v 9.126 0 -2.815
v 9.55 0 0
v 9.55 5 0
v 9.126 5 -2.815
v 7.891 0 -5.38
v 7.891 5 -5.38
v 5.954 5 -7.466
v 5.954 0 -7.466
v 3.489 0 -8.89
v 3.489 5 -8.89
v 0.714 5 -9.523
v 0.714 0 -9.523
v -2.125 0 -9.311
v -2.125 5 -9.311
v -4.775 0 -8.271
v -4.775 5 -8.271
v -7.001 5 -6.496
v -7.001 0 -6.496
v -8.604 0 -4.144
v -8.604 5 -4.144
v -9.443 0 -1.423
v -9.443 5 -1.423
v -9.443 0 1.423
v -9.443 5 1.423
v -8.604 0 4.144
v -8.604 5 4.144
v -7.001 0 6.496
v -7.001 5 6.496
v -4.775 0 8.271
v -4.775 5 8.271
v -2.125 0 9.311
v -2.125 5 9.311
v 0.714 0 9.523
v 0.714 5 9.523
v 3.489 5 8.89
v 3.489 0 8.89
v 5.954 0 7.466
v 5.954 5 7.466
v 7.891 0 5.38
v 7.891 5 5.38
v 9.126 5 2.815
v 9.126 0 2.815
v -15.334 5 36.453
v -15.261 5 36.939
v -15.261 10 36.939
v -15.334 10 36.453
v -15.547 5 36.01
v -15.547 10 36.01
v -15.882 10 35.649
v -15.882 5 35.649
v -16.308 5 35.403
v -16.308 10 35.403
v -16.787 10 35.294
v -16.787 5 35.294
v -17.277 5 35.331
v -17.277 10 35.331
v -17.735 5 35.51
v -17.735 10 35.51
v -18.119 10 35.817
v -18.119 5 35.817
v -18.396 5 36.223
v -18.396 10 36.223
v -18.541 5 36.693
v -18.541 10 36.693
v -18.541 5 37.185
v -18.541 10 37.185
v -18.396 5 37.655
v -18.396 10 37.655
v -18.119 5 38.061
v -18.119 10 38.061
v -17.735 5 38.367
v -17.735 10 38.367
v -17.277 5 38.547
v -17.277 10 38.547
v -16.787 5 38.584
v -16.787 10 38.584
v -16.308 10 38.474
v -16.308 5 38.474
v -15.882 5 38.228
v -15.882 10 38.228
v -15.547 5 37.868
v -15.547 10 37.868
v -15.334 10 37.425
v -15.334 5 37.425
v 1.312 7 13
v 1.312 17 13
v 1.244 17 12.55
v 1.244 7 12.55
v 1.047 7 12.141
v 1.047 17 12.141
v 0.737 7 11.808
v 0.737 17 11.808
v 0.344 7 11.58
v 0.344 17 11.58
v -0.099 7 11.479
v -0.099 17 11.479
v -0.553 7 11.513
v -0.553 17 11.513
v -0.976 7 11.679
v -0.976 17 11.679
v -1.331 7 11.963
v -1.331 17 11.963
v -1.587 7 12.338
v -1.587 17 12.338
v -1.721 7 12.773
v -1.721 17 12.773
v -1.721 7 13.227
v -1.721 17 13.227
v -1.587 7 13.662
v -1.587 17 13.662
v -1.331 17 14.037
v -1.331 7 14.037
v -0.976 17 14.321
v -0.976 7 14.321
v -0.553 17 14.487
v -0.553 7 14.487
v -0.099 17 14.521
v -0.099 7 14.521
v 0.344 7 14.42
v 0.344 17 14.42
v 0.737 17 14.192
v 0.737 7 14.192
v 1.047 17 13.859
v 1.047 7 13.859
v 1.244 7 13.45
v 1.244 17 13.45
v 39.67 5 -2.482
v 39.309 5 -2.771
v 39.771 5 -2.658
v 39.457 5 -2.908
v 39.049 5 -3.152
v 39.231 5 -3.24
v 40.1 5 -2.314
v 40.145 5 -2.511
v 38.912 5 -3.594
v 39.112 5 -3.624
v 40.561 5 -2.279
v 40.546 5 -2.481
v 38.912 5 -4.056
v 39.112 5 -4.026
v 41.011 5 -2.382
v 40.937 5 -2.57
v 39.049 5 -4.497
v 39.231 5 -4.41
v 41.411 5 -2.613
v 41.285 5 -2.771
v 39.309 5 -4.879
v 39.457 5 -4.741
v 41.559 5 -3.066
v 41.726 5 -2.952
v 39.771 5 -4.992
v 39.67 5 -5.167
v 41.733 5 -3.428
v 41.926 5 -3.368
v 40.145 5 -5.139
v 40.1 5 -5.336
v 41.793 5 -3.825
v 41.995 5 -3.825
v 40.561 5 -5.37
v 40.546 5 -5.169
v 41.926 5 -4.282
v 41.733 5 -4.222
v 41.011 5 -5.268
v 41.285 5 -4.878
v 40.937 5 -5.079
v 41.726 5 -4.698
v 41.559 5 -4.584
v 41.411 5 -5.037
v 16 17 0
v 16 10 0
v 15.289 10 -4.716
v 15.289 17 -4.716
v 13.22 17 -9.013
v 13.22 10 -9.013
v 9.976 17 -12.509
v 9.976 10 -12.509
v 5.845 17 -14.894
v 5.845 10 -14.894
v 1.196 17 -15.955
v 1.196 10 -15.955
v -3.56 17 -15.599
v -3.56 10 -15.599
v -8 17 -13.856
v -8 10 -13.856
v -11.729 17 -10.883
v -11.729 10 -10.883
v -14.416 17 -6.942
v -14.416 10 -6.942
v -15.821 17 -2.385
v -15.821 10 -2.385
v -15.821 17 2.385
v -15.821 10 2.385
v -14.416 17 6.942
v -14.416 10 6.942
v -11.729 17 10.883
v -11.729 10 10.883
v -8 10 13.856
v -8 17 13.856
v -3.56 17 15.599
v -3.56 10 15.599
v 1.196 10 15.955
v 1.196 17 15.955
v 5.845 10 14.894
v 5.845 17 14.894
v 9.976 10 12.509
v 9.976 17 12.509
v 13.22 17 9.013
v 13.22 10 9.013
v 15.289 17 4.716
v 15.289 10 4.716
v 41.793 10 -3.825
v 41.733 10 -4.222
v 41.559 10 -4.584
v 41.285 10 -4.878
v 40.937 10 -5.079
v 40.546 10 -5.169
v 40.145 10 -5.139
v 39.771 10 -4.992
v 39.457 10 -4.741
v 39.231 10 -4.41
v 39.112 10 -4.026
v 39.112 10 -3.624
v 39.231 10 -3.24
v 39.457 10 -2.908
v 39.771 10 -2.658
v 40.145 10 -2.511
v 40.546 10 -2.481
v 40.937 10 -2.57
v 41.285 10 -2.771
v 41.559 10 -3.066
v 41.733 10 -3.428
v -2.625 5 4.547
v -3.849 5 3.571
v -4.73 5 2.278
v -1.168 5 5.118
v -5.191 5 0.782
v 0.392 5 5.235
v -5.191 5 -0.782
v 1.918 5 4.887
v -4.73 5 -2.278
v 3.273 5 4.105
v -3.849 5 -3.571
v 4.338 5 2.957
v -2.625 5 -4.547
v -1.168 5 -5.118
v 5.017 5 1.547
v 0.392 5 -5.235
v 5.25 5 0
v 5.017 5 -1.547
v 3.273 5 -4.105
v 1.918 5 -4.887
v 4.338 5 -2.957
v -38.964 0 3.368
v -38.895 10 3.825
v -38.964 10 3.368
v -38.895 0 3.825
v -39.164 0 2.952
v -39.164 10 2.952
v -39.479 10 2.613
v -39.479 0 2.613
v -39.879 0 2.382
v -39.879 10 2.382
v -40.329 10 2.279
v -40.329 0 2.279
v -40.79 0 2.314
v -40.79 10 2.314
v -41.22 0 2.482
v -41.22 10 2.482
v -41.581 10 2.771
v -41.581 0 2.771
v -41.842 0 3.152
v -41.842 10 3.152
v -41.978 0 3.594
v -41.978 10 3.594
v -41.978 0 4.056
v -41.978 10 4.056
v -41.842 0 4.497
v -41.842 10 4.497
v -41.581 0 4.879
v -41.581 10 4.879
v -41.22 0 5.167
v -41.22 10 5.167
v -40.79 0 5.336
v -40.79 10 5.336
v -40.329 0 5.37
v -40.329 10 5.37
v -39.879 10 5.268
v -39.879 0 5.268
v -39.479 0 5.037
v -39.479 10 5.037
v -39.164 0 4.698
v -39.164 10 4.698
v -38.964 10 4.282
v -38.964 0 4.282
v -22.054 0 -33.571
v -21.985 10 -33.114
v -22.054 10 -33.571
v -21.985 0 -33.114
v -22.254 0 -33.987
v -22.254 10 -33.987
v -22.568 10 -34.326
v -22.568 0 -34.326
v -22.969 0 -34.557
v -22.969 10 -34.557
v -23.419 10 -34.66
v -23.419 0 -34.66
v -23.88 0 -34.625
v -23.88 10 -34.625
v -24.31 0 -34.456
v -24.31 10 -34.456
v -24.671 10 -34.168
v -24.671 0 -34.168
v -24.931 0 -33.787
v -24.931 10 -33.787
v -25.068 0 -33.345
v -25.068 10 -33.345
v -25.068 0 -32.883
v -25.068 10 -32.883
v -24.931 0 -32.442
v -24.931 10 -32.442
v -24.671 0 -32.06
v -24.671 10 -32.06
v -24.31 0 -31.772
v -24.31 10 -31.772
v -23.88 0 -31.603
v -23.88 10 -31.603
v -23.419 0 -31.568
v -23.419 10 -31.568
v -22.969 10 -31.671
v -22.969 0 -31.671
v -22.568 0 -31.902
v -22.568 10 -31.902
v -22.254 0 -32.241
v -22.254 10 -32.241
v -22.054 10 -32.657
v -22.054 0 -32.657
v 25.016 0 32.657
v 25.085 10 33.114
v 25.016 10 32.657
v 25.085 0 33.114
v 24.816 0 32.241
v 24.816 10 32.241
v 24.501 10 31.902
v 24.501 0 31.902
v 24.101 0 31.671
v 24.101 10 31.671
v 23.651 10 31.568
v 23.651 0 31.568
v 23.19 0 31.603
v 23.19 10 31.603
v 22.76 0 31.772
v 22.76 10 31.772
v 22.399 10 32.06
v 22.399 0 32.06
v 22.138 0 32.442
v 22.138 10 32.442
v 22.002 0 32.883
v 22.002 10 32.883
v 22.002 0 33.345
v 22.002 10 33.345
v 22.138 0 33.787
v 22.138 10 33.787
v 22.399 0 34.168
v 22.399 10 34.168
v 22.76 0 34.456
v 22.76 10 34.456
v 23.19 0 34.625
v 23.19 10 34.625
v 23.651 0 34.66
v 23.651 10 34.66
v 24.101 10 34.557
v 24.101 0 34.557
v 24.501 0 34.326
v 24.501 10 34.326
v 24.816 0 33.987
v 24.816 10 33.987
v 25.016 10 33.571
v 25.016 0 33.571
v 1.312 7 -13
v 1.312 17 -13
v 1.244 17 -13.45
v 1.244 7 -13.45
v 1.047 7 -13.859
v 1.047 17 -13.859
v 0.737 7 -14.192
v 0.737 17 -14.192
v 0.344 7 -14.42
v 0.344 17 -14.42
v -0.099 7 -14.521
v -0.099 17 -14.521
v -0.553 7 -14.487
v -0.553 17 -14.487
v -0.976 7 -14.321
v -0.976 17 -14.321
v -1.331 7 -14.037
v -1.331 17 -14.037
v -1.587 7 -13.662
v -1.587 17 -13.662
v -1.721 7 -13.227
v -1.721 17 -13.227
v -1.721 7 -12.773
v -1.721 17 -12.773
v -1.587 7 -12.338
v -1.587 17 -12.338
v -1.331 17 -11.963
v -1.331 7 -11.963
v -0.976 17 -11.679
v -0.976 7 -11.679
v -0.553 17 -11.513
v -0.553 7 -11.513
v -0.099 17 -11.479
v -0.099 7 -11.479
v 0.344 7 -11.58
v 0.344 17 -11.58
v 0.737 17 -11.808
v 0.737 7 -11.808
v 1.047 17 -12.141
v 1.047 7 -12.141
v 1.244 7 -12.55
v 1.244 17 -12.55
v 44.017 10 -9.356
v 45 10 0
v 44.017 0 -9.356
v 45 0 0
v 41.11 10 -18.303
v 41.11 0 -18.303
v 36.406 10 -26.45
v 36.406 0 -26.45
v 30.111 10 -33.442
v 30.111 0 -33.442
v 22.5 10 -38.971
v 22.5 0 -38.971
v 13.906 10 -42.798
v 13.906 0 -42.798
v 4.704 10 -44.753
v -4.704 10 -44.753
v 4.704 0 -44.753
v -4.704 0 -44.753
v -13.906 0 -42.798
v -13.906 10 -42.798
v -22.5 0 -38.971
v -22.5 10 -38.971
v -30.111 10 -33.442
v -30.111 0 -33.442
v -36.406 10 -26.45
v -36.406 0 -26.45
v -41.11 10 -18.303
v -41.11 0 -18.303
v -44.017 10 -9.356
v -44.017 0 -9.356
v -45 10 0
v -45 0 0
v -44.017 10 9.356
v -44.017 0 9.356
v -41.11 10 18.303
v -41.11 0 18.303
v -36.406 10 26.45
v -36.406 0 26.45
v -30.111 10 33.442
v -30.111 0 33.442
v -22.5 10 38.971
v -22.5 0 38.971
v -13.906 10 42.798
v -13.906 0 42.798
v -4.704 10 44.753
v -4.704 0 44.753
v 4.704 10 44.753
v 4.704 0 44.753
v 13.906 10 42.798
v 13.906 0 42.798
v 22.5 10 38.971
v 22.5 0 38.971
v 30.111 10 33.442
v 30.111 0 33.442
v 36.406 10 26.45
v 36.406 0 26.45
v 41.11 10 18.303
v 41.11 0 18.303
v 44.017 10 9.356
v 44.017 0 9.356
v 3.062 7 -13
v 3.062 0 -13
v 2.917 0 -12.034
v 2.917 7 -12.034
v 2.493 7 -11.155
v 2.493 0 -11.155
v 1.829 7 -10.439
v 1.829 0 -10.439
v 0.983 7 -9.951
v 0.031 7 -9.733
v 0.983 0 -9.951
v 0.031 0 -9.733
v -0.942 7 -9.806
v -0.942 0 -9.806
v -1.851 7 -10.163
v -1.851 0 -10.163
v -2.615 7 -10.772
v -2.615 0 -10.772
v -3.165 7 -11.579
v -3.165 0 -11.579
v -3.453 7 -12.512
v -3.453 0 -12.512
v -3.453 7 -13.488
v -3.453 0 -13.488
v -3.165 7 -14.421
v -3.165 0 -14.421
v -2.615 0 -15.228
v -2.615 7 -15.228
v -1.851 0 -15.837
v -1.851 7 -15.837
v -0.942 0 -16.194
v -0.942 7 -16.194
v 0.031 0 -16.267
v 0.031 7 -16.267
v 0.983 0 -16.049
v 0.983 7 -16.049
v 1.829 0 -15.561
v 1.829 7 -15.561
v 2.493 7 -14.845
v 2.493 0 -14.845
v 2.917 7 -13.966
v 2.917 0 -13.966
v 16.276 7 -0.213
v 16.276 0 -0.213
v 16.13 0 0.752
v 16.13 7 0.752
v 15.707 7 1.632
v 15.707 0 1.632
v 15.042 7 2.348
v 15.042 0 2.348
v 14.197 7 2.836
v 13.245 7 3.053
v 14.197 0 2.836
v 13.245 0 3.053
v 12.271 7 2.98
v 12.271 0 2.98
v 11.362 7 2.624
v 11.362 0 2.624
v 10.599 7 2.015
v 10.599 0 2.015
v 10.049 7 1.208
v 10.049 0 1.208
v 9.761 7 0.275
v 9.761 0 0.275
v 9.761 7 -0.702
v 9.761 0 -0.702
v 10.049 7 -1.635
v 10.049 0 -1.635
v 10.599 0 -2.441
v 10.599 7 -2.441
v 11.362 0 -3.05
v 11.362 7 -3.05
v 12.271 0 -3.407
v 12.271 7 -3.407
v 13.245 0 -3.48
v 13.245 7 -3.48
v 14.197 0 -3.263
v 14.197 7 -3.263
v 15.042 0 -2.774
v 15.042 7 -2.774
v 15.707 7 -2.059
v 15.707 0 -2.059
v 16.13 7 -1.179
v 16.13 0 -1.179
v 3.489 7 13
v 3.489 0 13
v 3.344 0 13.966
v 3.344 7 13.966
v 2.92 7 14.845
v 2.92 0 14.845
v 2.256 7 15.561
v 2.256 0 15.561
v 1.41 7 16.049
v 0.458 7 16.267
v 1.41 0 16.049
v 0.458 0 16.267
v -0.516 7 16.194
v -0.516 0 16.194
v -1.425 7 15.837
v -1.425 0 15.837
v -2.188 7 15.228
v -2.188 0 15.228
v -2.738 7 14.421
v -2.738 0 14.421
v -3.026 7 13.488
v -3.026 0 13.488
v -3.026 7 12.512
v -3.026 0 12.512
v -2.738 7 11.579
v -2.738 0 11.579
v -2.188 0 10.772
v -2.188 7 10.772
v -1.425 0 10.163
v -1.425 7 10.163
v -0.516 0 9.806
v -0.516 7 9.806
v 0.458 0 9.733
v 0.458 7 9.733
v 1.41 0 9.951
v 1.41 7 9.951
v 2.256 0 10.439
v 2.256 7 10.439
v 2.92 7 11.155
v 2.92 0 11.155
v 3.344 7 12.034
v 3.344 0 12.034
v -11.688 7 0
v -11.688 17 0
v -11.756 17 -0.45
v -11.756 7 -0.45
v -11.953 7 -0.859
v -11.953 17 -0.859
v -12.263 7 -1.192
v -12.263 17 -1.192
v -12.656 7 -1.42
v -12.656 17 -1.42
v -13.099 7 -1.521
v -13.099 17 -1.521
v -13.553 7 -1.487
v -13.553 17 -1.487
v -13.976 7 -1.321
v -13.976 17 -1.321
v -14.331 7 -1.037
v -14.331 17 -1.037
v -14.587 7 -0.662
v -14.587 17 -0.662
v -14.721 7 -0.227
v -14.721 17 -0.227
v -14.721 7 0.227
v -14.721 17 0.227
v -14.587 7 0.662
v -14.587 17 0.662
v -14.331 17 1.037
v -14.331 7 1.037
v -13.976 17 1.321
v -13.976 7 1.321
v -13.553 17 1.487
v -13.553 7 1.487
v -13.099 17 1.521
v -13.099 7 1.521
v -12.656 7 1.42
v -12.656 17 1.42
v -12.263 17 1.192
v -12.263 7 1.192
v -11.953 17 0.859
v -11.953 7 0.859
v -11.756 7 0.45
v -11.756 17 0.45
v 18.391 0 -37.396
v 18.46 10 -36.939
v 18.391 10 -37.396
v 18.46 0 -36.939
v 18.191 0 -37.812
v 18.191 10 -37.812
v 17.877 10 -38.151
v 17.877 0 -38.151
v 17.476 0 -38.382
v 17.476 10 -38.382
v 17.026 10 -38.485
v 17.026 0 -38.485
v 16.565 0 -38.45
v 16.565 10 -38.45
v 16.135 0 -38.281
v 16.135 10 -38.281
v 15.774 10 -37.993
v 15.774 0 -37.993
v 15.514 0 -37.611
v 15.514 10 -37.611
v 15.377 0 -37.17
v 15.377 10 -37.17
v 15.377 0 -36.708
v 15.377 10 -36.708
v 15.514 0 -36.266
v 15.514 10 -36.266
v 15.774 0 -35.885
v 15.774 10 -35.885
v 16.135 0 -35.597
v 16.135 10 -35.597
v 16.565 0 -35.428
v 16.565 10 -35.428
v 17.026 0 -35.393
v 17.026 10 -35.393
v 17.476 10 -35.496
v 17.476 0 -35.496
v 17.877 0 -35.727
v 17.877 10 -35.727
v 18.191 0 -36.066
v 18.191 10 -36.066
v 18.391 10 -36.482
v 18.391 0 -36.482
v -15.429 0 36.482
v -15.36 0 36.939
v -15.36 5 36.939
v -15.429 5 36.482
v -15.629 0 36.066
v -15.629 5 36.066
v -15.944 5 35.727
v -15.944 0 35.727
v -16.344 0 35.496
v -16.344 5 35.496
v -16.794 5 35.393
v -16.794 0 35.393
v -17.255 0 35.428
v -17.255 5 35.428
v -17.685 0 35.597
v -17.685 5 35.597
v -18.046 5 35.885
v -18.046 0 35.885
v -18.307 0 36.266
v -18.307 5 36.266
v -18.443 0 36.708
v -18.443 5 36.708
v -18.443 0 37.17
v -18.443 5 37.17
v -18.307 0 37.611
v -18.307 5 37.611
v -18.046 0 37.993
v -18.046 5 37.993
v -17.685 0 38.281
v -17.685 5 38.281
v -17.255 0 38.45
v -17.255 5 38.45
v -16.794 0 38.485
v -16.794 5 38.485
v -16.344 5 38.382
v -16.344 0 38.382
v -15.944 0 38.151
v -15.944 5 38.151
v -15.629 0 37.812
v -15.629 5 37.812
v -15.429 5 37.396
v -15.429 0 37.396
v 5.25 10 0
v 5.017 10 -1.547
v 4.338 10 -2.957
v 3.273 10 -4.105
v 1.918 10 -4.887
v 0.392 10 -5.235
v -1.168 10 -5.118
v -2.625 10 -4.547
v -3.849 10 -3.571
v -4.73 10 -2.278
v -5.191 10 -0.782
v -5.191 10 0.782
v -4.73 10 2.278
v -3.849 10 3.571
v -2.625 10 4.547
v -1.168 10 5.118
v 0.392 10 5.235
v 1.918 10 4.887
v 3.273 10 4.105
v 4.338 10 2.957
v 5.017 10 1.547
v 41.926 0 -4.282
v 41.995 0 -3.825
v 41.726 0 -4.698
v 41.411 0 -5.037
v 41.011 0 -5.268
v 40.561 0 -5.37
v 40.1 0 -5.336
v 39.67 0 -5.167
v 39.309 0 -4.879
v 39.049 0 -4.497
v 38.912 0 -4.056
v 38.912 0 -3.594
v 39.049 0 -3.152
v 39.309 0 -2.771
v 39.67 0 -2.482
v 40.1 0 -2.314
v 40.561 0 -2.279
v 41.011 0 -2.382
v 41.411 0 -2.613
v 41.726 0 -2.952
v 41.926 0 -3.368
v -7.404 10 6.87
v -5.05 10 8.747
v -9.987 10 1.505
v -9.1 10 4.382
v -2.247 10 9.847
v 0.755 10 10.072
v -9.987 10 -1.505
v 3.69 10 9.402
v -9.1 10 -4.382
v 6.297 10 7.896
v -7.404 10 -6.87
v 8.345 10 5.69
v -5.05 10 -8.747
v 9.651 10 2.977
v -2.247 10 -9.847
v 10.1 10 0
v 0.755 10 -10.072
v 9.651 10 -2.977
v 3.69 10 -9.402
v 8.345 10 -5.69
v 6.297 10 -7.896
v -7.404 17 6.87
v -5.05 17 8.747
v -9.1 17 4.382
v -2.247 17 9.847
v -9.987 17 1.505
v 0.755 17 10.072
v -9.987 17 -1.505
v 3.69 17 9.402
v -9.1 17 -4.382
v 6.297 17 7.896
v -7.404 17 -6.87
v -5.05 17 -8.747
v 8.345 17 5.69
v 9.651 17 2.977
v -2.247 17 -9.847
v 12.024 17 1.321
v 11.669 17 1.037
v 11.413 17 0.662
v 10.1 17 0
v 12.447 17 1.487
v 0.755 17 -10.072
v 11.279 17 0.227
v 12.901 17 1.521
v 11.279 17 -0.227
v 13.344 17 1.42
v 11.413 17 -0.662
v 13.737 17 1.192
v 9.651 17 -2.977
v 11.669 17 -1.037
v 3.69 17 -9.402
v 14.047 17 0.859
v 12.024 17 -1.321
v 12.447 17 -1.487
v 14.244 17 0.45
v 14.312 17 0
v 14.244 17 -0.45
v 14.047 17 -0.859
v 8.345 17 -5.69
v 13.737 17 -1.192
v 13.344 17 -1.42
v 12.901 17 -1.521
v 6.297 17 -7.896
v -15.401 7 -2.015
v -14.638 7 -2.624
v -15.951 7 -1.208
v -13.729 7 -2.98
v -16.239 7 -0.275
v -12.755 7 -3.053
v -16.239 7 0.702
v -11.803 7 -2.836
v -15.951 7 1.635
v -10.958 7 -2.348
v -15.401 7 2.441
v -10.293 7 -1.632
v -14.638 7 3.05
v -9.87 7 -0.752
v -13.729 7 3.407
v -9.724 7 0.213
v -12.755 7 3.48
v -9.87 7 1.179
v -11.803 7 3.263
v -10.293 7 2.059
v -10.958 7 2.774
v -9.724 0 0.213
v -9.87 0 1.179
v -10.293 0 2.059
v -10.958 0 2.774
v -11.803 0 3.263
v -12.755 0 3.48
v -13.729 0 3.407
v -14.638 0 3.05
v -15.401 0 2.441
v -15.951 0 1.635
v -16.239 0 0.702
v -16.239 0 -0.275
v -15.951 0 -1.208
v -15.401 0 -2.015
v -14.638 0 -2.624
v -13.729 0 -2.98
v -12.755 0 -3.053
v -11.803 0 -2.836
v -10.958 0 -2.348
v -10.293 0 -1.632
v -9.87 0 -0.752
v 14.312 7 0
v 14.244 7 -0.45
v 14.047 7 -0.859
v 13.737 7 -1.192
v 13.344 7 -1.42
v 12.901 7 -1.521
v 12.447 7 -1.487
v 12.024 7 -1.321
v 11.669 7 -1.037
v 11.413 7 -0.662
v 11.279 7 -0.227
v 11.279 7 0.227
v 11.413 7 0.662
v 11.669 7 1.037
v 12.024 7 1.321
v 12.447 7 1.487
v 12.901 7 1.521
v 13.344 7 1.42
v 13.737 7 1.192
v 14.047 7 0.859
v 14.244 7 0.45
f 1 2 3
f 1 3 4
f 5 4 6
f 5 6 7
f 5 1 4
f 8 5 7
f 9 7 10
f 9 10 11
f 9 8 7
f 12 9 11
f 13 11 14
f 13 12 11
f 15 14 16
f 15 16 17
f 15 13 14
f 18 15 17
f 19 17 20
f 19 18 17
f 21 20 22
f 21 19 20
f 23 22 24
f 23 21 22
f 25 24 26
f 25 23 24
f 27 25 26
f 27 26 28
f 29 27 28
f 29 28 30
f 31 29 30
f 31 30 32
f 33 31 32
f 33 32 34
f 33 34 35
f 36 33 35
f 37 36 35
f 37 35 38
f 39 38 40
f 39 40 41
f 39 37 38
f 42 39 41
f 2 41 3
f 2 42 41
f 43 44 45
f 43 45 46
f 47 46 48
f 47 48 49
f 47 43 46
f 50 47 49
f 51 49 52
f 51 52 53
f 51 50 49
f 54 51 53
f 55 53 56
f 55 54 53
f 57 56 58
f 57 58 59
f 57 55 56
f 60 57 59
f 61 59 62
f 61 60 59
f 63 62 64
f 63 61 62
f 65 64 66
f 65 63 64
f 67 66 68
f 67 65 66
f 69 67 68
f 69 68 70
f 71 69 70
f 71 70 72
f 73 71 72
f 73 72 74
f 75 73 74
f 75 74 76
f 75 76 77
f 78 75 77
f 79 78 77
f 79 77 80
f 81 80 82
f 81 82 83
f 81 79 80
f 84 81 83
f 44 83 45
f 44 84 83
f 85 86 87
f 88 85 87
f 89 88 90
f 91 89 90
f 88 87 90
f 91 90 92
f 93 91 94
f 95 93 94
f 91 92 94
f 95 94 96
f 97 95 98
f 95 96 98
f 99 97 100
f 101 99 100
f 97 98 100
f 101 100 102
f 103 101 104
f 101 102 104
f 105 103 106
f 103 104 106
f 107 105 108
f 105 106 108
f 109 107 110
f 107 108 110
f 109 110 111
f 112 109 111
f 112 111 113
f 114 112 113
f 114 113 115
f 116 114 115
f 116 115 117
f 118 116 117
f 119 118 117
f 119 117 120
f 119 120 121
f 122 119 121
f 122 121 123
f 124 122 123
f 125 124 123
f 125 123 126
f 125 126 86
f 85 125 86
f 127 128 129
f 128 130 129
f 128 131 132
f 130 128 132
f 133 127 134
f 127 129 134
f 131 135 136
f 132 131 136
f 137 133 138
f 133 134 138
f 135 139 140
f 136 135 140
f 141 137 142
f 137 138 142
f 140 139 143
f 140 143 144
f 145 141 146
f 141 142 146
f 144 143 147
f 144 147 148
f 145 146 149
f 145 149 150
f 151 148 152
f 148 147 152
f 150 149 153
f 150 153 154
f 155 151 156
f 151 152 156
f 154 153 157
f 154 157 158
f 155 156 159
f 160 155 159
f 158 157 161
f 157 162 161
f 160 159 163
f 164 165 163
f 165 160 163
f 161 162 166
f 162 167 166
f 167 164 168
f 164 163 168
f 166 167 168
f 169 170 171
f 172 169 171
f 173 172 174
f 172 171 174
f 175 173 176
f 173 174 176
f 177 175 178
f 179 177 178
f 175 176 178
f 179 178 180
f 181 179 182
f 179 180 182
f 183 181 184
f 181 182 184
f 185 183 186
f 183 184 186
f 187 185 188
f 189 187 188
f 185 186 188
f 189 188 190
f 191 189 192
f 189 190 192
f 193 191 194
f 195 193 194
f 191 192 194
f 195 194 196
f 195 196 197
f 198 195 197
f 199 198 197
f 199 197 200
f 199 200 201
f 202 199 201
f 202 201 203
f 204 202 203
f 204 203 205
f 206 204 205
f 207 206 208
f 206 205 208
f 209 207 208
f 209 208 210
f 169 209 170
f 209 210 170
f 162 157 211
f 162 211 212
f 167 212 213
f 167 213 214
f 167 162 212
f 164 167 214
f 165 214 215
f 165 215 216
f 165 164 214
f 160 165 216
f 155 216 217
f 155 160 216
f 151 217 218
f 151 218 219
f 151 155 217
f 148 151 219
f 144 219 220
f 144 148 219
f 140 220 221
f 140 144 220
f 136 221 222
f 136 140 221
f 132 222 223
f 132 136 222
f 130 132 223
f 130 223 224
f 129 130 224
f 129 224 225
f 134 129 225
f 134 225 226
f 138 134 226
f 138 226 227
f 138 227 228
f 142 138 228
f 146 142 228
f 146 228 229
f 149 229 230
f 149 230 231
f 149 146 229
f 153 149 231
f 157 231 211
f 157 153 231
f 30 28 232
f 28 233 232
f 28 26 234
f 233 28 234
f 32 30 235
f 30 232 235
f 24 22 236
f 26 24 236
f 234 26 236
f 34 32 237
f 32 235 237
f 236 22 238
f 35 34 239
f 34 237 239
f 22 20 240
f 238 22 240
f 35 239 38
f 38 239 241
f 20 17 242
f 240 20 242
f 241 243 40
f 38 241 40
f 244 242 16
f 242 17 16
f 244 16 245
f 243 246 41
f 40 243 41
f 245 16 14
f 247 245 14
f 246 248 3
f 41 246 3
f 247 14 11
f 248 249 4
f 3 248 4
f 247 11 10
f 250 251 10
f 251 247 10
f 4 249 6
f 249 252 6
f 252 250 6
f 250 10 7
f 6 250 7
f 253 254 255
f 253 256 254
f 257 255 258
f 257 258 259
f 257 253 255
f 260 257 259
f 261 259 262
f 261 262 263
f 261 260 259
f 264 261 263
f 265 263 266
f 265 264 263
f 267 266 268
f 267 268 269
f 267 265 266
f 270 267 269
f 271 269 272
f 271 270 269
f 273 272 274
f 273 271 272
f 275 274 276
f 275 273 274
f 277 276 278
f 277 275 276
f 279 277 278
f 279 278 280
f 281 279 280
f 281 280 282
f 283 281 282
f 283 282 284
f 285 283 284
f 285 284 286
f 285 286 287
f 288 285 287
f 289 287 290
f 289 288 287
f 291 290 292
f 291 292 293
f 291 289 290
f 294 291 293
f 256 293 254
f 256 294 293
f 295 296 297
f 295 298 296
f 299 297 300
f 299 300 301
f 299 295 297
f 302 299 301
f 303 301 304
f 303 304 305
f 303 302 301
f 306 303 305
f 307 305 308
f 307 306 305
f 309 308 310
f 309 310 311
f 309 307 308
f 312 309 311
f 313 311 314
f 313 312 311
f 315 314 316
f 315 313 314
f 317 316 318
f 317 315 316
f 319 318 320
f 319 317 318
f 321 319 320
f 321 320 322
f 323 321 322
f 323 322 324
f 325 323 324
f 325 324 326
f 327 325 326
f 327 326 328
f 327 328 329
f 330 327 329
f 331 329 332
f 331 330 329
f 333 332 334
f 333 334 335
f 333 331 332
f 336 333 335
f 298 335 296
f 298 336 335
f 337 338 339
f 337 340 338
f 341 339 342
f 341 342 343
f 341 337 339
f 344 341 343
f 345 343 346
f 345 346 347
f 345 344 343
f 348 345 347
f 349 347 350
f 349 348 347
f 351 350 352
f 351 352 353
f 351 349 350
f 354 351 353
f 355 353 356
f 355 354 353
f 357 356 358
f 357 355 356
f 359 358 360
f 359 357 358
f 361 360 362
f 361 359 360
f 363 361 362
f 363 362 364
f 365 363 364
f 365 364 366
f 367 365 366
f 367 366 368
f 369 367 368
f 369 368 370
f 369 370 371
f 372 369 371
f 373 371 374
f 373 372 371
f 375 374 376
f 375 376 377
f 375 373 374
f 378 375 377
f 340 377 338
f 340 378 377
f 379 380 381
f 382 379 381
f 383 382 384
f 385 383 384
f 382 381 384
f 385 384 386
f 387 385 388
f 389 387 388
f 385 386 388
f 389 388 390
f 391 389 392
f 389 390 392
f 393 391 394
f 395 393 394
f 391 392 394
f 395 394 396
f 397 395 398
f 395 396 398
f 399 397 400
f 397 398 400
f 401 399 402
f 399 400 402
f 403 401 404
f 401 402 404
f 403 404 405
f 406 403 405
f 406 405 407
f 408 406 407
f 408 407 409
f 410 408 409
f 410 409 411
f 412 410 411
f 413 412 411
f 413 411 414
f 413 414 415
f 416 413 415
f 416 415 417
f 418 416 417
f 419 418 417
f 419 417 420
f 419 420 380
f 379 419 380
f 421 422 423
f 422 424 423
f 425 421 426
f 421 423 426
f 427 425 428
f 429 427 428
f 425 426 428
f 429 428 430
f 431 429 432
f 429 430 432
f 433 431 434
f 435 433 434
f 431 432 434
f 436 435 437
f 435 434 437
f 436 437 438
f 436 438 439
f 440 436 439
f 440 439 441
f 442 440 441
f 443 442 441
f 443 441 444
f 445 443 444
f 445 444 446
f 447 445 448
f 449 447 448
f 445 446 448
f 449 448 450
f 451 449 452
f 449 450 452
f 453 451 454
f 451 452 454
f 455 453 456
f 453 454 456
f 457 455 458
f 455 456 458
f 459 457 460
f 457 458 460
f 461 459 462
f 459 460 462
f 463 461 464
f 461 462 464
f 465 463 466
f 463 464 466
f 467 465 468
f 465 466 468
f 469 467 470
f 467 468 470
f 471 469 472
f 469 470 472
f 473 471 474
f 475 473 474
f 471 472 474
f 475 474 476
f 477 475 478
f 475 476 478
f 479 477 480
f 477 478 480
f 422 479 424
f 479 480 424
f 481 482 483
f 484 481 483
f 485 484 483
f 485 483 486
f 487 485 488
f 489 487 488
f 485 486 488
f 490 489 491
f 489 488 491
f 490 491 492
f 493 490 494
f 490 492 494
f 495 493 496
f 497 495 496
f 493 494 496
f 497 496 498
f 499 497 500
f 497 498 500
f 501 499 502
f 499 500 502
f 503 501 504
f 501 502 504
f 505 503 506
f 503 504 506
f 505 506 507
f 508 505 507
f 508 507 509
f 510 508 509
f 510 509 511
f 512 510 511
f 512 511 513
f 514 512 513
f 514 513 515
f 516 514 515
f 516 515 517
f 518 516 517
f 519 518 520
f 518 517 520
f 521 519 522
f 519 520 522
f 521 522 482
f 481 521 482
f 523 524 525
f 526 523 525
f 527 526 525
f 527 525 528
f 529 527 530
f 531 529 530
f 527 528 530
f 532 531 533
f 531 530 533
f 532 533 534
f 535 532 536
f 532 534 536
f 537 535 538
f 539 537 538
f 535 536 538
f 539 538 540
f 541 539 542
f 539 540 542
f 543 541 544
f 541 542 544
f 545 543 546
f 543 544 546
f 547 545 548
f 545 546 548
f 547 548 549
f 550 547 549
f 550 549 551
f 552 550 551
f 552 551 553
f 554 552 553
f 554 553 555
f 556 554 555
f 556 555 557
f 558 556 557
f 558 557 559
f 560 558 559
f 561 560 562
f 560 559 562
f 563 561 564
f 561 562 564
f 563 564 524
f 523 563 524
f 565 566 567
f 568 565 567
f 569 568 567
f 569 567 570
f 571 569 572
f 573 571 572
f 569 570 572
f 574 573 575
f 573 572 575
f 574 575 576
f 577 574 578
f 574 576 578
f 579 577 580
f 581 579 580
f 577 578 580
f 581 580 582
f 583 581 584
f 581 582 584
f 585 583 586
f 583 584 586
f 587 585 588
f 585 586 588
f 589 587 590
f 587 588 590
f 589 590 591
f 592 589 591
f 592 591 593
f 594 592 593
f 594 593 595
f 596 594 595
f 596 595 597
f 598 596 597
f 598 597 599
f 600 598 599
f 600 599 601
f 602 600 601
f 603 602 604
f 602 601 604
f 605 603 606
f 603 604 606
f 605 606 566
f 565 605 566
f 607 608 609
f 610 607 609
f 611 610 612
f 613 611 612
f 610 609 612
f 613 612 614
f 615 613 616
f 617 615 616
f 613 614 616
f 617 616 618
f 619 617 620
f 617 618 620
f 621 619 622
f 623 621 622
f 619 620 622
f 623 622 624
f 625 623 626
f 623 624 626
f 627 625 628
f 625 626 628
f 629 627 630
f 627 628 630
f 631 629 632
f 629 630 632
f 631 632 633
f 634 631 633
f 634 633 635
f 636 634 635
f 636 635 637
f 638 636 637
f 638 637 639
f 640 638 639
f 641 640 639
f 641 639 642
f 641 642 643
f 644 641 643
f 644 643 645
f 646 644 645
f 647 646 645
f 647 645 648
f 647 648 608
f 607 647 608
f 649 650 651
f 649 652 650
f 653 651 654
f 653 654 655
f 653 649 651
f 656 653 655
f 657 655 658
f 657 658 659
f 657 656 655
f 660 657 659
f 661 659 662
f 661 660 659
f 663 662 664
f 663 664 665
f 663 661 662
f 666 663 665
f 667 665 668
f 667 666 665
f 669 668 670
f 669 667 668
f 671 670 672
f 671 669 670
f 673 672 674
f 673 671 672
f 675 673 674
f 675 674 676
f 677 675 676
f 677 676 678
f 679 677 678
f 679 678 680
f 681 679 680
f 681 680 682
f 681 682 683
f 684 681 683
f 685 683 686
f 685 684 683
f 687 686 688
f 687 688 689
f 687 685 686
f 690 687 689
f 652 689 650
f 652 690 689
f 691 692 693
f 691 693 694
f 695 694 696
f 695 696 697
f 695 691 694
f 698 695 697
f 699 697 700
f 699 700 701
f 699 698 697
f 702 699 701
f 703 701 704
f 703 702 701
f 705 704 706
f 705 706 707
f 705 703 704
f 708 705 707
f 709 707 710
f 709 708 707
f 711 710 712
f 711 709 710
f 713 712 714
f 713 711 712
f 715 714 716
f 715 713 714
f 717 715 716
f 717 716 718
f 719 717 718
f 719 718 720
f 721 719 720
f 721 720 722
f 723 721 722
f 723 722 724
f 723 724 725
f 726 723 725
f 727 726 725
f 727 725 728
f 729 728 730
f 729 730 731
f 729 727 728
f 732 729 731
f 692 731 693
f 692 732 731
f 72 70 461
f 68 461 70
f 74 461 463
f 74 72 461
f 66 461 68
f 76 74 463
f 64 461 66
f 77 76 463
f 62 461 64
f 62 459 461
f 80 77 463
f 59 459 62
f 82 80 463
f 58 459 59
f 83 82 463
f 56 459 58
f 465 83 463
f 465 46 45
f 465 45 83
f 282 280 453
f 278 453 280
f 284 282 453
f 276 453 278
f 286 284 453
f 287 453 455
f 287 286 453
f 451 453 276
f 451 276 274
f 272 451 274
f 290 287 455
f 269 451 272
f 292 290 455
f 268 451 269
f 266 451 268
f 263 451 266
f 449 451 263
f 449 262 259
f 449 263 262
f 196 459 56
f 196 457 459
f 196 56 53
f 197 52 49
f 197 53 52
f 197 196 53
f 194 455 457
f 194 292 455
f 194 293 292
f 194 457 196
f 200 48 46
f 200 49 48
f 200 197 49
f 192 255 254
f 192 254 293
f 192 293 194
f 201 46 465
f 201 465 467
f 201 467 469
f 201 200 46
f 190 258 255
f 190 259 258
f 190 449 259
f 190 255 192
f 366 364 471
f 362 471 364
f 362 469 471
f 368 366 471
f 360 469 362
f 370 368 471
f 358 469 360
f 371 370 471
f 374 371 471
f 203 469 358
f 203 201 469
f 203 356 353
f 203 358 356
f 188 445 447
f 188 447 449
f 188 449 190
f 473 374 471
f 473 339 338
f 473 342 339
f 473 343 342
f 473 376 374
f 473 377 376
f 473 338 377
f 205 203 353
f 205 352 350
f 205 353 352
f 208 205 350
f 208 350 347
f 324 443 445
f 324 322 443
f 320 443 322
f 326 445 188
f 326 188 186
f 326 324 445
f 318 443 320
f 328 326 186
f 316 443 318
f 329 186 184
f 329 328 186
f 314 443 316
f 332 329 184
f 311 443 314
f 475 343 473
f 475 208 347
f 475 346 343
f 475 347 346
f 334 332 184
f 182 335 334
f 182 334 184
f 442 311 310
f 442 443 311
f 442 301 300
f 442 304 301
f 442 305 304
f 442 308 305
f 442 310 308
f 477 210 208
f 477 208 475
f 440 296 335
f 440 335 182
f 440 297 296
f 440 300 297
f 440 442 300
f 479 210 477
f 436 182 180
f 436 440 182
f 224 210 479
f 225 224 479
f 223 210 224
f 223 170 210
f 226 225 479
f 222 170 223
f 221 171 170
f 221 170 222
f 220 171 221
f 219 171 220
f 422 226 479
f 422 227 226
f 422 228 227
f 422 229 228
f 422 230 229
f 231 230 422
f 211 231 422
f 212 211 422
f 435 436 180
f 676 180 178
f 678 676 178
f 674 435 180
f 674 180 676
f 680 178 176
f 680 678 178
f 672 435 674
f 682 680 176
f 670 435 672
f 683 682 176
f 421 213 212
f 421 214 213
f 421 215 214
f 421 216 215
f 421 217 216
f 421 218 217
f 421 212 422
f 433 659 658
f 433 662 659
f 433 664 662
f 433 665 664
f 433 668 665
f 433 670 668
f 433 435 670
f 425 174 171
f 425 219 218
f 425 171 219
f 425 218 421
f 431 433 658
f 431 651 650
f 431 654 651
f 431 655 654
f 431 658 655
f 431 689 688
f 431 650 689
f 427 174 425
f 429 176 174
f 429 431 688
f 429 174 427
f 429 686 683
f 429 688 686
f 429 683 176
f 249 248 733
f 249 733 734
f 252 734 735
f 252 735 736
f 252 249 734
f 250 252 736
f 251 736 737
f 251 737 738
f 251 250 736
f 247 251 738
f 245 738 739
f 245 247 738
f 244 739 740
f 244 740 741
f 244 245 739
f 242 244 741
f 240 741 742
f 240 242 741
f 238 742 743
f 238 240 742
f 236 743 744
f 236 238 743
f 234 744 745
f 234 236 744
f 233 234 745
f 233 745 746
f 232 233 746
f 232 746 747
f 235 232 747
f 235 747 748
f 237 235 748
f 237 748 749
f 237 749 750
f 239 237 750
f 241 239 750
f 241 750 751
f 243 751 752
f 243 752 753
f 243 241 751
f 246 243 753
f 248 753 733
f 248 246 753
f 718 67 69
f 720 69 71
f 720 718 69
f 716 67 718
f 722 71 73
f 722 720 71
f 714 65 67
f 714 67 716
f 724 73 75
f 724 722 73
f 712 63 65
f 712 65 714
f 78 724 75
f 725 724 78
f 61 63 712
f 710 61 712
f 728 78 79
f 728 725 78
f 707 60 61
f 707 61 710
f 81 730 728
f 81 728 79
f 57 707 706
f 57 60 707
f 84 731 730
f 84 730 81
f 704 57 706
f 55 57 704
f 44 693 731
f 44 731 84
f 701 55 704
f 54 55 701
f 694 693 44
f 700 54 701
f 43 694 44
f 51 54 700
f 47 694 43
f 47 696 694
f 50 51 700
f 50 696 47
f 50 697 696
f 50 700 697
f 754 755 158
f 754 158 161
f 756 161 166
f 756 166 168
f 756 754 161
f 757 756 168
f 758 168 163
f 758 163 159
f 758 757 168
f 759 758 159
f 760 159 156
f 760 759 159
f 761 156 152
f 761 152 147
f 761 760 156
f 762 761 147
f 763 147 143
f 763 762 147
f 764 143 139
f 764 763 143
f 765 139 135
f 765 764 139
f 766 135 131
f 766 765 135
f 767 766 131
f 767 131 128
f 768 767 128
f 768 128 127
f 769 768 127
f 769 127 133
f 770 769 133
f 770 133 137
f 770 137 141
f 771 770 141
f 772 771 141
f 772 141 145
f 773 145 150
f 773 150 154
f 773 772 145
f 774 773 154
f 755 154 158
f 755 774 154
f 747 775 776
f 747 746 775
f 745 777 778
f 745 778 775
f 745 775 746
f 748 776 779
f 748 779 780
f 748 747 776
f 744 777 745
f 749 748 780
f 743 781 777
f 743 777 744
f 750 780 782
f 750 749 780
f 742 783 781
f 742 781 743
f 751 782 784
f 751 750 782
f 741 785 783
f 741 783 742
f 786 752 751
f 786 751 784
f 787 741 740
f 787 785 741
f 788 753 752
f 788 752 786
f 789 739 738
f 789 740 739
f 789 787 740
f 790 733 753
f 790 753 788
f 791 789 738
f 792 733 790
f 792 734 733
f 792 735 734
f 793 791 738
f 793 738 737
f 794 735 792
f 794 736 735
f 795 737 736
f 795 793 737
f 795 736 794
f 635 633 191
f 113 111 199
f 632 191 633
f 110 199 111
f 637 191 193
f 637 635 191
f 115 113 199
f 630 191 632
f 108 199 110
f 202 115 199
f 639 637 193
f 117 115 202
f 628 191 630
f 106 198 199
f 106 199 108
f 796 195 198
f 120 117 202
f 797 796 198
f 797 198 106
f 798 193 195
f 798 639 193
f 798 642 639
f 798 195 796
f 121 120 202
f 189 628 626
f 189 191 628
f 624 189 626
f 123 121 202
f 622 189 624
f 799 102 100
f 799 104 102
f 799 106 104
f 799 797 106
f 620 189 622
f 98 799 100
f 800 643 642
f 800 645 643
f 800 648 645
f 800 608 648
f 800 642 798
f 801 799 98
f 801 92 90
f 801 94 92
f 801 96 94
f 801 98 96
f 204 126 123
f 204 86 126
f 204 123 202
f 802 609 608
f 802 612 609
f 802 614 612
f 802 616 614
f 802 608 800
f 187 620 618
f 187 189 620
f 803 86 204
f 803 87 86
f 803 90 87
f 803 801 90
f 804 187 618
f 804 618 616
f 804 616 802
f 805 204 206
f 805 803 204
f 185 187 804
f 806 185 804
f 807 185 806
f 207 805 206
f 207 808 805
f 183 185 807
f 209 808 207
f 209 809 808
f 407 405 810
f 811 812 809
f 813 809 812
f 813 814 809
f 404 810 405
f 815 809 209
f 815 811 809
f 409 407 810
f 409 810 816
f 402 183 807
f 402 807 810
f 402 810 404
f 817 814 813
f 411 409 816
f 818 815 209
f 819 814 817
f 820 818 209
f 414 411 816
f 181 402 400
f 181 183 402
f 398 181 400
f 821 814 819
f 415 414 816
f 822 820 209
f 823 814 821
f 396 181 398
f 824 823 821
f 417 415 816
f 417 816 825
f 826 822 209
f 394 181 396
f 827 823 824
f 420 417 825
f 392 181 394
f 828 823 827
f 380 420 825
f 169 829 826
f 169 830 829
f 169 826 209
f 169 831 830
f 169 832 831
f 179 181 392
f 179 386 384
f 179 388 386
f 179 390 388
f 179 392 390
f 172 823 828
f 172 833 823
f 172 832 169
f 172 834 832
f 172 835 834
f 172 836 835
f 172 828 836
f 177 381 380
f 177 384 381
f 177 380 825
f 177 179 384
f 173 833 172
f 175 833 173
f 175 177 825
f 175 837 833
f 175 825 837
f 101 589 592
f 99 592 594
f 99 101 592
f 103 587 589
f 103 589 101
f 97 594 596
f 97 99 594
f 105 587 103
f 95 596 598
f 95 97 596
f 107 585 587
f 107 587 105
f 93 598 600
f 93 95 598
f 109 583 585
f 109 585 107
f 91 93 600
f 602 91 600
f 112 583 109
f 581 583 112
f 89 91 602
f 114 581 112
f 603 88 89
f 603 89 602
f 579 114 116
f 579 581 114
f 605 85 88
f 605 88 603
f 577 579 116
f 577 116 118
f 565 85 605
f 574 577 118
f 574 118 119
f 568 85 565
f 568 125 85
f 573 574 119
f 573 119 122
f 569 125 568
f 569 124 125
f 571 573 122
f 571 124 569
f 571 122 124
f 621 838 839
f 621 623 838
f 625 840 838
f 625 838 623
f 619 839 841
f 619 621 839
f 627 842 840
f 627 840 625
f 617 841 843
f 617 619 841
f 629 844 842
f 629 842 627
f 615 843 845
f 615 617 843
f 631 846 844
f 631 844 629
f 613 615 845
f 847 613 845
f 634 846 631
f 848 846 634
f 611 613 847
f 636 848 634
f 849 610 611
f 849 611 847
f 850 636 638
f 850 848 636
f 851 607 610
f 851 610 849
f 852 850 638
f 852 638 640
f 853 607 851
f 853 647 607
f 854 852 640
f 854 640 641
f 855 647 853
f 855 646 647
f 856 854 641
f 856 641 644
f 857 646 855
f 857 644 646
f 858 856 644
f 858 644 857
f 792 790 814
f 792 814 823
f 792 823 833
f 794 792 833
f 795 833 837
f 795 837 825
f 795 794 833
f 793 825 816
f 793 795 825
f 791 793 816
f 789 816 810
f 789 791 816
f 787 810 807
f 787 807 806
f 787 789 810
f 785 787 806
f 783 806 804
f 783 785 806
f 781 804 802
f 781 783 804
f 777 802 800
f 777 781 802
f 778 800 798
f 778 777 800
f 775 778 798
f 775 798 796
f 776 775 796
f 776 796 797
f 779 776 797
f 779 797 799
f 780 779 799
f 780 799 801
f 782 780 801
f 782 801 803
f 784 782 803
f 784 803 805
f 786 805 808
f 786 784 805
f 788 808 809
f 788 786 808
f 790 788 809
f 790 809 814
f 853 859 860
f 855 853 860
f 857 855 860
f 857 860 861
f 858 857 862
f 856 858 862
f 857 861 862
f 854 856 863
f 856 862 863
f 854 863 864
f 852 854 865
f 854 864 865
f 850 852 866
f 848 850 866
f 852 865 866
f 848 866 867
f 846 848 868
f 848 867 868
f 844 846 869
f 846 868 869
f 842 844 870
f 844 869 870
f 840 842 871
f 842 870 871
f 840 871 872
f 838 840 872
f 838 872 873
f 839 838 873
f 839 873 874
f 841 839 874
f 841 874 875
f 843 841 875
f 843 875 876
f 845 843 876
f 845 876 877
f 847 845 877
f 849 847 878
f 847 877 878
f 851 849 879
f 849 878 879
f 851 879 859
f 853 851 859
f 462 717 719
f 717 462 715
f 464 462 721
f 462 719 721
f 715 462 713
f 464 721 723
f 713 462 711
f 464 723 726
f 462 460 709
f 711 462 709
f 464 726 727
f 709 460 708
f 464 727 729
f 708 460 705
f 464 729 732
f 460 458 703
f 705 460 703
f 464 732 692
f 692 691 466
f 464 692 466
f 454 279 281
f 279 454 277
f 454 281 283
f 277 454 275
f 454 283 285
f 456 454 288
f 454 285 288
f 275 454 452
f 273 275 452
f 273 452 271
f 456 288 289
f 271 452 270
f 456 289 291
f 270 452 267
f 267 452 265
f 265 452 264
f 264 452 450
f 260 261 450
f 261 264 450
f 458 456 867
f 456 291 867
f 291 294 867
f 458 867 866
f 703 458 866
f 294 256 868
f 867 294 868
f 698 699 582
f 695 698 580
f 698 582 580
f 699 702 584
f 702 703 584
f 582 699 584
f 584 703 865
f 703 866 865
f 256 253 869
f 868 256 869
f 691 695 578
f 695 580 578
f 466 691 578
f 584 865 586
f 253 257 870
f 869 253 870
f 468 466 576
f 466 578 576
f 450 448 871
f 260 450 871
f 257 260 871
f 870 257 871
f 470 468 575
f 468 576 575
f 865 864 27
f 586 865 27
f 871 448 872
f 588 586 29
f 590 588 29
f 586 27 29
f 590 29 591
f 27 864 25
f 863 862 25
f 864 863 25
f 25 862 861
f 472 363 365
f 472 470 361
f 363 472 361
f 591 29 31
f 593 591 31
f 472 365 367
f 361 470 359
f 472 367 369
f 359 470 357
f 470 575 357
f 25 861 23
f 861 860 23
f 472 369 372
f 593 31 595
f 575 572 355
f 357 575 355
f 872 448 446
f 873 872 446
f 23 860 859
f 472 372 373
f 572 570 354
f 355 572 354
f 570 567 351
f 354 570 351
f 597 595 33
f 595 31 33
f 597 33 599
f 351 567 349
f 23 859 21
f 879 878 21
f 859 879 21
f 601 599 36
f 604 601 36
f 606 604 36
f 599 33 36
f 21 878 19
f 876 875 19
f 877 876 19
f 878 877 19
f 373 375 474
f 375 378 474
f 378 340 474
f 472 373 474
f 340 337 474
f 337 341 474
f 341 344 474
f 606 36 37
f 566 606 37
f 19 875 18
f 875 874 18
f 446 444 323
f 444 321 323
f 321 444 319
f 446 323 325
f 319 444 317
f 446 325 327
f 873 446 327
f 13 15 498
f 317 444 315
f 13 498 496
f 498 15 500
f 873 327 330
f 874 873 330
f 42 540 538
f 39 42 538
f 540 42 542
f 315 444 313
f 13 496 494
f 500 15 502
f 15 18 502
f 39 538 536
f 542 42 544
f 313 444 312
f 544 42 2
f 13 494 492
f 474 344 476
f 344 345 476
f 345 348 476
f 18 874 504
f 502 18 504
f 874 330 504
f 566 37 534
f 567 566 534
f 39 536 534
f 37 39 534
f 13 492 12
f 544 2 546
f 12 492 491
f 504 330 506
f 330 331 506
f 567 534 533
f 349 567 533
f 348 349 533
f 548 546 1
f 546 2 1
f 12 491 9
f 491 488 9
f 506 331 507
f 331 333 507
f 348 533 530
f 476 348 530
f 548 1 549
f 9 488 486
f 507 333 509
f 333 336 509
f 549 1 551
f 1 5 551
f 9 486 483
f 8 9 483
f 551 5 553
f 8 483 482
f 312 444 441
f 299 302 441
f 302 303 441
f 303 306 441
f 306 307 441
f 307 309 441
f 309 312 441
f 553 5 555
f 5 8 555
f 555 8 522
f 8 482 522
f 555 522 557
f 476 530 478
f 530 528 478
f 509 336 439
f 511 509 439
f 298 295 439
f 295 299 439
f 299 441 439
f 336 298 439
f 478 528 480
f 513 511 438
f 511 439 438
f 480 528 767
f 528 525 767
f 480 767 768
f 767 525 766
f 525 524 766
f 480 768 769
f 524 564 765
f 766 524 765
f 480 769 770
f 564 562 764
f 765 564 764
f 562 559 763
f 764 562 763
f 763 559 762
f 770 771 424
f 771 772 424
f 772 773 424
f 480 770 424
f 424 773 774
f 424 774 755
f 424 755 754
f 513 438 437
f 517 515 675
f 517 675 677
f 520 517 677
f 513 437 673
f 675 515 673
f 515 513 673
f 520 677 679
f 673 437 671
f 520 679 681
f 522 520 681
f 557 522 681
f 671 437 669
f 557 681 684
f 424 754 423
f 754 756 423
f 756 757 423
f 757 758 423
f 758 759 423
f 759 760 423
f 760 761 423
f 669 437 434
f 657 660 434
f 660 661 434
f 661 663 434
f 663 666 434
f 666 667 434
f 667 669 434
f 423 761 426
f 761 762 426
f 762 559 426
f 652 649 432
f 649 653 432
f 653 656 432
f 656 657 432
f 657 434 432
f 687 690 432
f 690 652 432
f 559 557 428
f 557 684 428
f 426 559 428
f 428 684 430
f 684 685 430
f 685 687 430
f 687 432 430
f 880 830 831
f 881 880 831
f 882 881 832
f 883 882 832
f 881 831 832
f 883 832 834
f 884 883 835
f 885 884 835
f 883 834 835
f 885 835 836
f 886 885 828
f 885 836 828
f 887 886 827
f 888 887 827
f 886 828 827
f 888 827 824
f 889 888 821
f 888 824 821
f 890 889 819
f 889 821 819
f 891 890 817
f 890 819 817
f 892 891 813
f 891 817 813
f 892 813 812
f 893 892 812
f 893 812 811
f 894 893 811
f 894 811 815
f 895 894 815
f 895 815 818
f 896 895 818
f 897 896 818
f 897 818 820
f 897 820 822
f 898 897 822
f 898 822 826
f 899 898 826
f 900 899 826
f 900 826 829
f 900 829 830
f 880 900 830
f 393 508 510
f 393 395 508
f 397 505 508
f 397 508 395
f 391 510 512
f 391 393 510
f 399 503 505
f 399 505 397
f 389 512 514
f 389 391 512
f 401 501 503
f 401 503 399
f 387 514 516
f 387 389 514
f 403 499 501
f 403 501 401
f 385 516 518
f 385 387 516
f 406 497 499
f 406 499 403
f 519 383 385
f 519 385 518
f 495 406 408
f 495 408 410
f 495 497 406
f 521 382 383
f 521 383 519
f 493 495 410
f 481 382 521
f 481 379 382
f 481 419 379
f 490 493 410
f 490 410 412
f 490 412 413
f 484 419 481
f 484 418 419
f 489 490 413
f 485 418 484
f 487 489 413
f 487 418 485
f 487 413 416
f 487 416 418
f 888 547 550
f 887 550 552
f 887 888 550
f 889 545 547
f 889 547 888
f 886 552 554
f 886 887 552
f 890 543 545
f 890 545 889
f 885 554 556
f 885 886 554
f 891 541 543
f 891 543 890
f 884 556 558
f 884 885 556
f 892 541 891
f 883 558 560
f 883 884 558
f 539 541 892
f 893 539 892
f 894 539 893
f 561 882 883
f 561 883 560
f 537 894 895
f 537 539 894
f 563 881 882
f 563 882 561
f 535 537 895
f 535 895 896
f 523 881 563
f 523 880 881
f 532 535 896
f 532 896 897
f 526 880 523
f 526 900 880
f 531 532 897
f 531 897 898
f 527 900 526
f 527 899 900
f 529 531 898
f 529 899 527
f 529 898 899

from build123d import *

# Parameters (mm, degrees)
SKETCH1_R           = 45
SKETCH1_R_2         = 9.55
SKETCH1_R_3         = 1.55
BOSS_EXTRUDE1_DEPTH = 5
SKETCH3_R           = 45
SKETCH3_R_2         = 5.25
SKETCH3_R_3         = 1.55
SKETCH3_R_4         = 1.347664629
SKETCH3_R_5         = 1.649528324
BOSS_EXTRUDE2_DEPTH = 5
SKETCH4_R           = 16
SKETCH4_R_2         = 10.1
BOSS_EXTRUDE3_DEPTH = 7
SKETCH5_R           = 1.525
CUT_EXTRUDE1_DEPTH  = 46
SKETCH8_R           = 3.275737446
CUT_EXTRUDE4_DEPTH  = 7


with BuildPart() as part:
    # Sketch1 → Boss-Extrude1 (new body)
    with BuildSketch(Plane(origin=(0, 0, 0), x_dir=(1, 0, 0), z_dir=(0, 1, 0))):
        Circle(SKETCH1_R)
        Circle(SKETCH1_R_2, mode=Mode.SUBTRACT)
        with Locations((23.534905201, -33.114037619)):
            Circle(SKETCH1_R_3, mode=Mode.SUBTRACT)
        with Locations((-16.9101452, -36.938844589)):
            Circle(SKETCH1_R_3, mode=Mode.SUBTRACT)
        with Locations((-40.4450504, -3.82480697)):
            Circle(SKETCH1_R_3, mode=Mode.SUBTRACT)
        with Locations((-23.534905201, 33.114037619)):
            Circle(SKETCH1_R_3, mode=Mode.SUBTRACT)
        with Locations((16.9101452, 36.938844589)):
            Circle(SKETCH1_R_3, mode=Mode.SUBTRACT)
        with Locations((40.4450504, 3.82480697)):
            Circle(SKETCH1_R_3, mode=Mode.SUBTRACT)
    extrude(amount=BOSS_EXTRUDE1_DEPTH)

    # Sketch3 → Boss-Extrude2 (add)
    with BuildSketch(Plane(origin=(0, 5, 0), x_dir=(1, 0, 0), z_dir=(0, 1, 0))):
        Circle(SKETCH3_R)
        Circle(SKETCH3_R_2, mode=Mode.SUBTRACT)
        with Locations((16.9101452, 36.938844589)):
            Circle(SKETCH3_R_3, mode=Mode.SUBTRACT)
        with Locations((40.4450504, 3.82480697)):
            Circle(SKETCH3_R_4, mode=Mode.SUBTRACT)
        with Locations((23.534905201, -33.114037619)):
            Circle(SKETCH3_R_3, mode=Mode.SUBTRACT)
        with Locations((-16.9101452, -36.938844589)):
            Circle(SKETCH3_R_5, mode=Mode.SUBTRACT)
        with Locations((-40.4450504, -3.82480697)):
            Circle(SKETCH3_R_3, mode=Mode.SUBTRACT)
        with Locations((-23.534905201, 33.114037619)):
            Circle(SKETCH3_R_3, mode=Mode.SUBTRACT)
    extrude(amount=BOSS_EXTRUDE2_DEPTH)

    # Sketch4 → Boss-Extrude3 (add)
    with BuildSketch(Plane(origin=(0, 10, 0), x_dir=(1, 0, 0), z_dir=(0, 1, 0))):
        Circle(SKETCH4_R)
        Circle(SKETCH4_R_2, mode=Mode.SUBTRACT)
    extrude(amount=BOSS_EXTRUDE3_DEPTH)

    # Sketch5 → Cut-Extrude1 (cut)
    with BuildSketch(Plane(origin=(0, 17, 0), x_dir=(1, 0, 0), z_dir=(0, 1, 0))):
        with Locations((12.786648762, 0)):
            Circle(SKETCH5_R)
        with Locations((-0.213351238, -13)):
            Circle(SKETCH5_R)
        with Locations((-13.213351238, 0)):
            Circle(SKETCH5_R)
        with Locations((-0.213351238, 13)):
            Circle(SKETCH5_R)
    extrude(amount=-CUT_EXTRUDE1_DEPTH, mode=Mode.SUBTRACT)

    # Sketch8 → Cut-Extrude4 (cut)
    with BuildSketch(Plane.XZ):
        with Locations((-0.213351238, -13)):
            Circle(SKETCH8_R)
        with Locations((-13, 0.213351238)):
            Circle(SKETCH8_R)
        with Locations((0.213351238, 13)):
            Circle(SKETCH8_R)
        with Locations((13, -0.213351238)):
            Circle(SKETCH8_R)
    extrude(amount=-CUT_EXTRUDE4_DEPTH, mode=Mode.SUBTRACT)


solid = part.part
